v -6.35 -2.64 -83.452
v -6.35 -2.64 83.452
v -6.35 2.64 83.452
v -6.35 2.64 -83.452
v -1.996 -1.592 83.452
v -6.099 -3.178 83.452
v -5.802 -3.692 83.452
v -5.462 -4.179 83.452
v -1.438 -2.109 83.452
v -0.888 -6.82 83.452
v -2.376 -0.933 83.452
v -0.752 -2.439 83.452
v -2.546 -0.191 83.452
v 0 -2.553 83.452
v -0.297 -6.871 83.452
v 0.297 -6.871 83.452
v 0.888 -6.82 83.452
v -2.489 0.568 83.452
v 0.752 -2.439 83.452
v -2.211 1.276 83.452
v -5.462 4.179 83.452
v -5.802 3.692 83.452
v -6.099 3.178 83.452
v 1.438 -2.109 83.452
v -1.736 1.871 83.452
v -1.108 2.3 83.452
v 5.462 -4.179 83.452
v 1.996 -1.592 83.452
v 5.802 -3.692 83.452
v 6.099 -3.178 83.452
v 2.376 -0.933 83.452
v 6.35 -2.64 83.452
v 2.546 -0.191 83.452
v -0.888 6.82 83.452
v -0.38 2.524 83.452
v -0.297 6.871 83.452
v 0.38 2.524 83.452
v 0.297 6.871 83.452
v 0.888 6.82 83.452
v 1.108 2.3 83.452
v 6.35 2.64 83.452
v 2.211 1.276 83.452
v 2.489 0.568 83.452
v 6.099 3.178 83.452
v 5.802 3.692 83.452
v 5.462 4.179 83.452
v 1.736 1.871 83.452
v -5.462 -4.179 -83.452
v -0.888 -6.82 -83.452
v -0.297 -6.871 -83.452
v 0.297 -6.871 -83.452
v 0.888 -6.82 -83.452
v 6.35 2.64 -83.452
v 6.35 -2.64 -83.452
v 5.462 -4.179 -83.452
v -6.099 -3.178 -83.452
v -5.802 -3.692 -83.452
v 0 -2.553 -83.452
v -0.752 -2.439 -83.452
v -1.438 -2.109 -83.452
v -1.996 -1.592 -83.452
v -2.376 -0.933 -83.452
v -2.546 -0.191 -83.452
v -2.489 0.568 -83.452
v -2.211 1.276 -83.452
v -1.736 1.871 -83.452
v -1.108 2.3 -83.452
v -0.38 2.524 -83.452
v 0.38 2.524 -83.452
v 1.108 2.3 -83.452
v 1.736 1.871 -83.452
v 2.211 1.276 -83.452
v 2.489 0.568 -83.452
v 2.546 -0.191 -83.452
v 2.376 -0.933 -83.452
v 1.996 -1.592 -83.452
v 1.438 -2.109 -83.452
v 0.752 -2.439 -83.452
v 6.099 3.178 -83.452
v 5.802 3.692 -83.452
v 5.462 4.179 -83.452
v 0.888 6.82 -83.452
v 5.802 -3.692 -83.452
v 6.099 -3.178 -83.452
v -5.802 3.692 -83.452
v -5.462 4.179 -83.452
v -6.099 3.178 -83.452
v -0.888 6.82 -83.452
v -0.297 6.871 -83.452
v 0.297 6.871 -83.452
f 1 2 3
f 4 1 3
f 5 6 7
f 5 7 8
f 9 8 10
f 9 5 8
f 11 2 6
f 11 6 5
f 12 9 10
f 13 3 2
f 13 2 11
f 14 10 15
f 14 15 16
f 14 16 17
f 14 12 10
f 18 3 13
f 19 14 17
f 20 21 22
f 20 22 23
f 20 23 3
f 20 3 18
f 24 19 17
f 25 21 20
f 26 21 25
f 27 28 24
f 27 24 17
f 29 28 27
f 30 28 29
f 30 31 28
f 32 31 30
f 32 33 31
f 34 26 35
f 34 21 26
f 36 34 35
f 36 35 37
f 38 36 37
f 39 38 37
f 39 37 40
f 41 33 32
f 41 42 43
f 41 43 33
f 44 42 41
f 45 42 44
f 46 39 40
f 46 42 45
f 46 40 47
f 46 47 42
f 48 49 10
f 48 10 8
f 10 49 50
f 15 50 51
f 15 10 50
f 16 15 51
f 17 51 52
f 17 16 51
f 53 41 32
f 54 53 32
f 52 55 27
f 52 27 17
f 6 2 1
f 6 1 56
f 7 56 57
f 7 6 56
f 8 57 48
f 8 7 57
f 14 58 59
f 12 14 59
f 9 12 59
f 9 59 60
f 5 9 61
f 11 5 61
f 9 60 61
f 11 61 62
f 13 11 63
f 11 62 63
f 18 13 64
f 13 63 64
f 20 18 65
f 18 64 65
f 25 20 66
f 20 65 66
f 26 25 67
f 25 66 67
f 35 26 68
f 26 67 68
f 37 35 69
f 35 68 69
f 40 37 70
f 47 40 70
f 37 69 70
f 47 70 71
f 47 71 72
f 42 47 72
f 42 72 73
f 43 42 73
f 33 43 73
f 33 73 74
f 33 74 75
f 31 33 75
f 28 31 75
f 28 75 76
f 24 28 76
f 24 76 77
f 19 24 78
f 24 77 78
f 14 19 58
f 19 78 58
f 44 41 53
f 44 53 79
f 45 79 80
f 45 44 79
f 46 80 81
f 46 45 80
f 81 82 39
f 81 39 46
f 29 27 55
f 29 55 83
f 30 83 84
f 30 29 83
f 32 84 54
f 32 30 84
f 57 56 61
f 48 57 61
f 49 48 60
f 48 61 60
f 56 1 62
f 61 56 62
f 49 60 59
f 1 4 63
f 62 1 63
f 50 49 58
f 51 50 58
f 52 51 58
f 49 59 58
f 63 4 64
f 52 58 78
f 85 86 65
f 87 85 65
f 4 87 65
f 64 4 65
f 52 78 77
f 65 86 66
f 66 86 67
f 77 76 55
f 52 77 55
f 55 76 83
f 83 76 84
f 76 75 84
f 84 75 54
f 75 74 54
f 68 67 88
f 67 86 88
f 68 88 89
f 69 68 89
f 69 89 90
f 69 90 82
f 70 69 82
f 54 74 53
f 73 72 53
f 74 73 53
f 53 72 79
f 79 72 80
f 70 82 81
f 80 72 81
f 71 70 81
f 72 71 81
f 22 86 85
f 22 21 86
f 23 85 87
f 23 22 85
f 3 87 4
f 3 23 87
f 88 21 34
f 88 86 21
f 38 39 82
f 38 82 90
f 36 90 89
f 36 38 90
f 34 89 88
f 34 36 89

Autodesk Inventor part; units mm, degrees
ref_plane "YZ Plane" through (0, 0, 0) normal (1, 0, 0) x (0, 1, 0)
ref_plane "XZ Plane" through (0, 0, 0) normal (0, 1, 0) x (-1, 0, 0)
ref_plane "XY Plane" through (0, 0, 0) normal (0, 0, 1) x (1, 0, 0)
sketch "Sketch1" plane through (0, 0, 0) normal (0, 0, 1) x (1, 0, 0)
  line L0 (-6.35, -3.6662) -> (-6.35, 3.6662)
  line L1 (-6.35, 3.6662) -> (0, 7.3323)
  line L2 (0, 7.3323) -> (6.35, 3.6662)
  line L3 (6.35, 3.6662) -> (6.35, -3.6662)
  line L4 (6.35, -3.6662) -> (0, -7.3323)
  line L5 (0, -7.3323) -> (-6.35, -3.6662)
  point P0 (0, 0)
  point P1 (0, 0)
  dimension "Size" = 12.7
extrude "Extrusion1" add sketch "Sketch1" along normal mid plane 166.9034
sketch "Sketch3" plane through (0, 0, 83.4517) normal (0, 0, 1) x (1, 0, 0)
  line L0 (-6.35, 3.6662) -> (0, 7.3323) construction
  line L1 (0, 7.3323) -> (6.35, 3.6662) construction
  line L2 (6.35, 3.6662) -> (6.35, -3.6662) construction
  line L3 (6.35, -3.6662) -> (0, -7.3323) construction
  line L4 (0, -7.3323) -> (-6.35, -3.6662) construction
  line L5 (-6.35, -3.6662) -> (-6.35, 3.6662) construction
  point P0 (0, 0)
hole "Hole1" at (0, 0, 83.4517) direction (0, 0, -1) diameter 5.1054 end through all
sketch "Sketch4" plane through (0, 0, 83.4517) normal (0, 0, 1) x (1, 0, 0)
  circle A0 centre (0, 0) radius 2.5527 construction
  line L0 (-6.35, 3.6662) -> (0, 7.3323) construction
  line L1 (0, 7.3323) -> (6.35, 3.6662) construction
  line L2 (6.35, 3.6662) -> (6.35, -3.6662) construction
  line L3 (6.35, -3.6662) -> (0, -7.3323) construction
  line L4 (0, -7.3323) -> (-6.35, -3.6662) construction
  line L5 (-6.35, -3.6662) -> (-6.35, 3.6662) construction
  circle A1 centre (0, 0) radius 6.8771
  circle A2 centre (0, 0) radius 8.89
  dimension "thunder" = 13.7541
  dimension "d16" = 17.78
extrude "Extrusion3" cut sketch "Sketch4" against normal through all
equation "\"bearing\" = 25.4"
properties part number "GP3-005" material "Aluminum 6061"
